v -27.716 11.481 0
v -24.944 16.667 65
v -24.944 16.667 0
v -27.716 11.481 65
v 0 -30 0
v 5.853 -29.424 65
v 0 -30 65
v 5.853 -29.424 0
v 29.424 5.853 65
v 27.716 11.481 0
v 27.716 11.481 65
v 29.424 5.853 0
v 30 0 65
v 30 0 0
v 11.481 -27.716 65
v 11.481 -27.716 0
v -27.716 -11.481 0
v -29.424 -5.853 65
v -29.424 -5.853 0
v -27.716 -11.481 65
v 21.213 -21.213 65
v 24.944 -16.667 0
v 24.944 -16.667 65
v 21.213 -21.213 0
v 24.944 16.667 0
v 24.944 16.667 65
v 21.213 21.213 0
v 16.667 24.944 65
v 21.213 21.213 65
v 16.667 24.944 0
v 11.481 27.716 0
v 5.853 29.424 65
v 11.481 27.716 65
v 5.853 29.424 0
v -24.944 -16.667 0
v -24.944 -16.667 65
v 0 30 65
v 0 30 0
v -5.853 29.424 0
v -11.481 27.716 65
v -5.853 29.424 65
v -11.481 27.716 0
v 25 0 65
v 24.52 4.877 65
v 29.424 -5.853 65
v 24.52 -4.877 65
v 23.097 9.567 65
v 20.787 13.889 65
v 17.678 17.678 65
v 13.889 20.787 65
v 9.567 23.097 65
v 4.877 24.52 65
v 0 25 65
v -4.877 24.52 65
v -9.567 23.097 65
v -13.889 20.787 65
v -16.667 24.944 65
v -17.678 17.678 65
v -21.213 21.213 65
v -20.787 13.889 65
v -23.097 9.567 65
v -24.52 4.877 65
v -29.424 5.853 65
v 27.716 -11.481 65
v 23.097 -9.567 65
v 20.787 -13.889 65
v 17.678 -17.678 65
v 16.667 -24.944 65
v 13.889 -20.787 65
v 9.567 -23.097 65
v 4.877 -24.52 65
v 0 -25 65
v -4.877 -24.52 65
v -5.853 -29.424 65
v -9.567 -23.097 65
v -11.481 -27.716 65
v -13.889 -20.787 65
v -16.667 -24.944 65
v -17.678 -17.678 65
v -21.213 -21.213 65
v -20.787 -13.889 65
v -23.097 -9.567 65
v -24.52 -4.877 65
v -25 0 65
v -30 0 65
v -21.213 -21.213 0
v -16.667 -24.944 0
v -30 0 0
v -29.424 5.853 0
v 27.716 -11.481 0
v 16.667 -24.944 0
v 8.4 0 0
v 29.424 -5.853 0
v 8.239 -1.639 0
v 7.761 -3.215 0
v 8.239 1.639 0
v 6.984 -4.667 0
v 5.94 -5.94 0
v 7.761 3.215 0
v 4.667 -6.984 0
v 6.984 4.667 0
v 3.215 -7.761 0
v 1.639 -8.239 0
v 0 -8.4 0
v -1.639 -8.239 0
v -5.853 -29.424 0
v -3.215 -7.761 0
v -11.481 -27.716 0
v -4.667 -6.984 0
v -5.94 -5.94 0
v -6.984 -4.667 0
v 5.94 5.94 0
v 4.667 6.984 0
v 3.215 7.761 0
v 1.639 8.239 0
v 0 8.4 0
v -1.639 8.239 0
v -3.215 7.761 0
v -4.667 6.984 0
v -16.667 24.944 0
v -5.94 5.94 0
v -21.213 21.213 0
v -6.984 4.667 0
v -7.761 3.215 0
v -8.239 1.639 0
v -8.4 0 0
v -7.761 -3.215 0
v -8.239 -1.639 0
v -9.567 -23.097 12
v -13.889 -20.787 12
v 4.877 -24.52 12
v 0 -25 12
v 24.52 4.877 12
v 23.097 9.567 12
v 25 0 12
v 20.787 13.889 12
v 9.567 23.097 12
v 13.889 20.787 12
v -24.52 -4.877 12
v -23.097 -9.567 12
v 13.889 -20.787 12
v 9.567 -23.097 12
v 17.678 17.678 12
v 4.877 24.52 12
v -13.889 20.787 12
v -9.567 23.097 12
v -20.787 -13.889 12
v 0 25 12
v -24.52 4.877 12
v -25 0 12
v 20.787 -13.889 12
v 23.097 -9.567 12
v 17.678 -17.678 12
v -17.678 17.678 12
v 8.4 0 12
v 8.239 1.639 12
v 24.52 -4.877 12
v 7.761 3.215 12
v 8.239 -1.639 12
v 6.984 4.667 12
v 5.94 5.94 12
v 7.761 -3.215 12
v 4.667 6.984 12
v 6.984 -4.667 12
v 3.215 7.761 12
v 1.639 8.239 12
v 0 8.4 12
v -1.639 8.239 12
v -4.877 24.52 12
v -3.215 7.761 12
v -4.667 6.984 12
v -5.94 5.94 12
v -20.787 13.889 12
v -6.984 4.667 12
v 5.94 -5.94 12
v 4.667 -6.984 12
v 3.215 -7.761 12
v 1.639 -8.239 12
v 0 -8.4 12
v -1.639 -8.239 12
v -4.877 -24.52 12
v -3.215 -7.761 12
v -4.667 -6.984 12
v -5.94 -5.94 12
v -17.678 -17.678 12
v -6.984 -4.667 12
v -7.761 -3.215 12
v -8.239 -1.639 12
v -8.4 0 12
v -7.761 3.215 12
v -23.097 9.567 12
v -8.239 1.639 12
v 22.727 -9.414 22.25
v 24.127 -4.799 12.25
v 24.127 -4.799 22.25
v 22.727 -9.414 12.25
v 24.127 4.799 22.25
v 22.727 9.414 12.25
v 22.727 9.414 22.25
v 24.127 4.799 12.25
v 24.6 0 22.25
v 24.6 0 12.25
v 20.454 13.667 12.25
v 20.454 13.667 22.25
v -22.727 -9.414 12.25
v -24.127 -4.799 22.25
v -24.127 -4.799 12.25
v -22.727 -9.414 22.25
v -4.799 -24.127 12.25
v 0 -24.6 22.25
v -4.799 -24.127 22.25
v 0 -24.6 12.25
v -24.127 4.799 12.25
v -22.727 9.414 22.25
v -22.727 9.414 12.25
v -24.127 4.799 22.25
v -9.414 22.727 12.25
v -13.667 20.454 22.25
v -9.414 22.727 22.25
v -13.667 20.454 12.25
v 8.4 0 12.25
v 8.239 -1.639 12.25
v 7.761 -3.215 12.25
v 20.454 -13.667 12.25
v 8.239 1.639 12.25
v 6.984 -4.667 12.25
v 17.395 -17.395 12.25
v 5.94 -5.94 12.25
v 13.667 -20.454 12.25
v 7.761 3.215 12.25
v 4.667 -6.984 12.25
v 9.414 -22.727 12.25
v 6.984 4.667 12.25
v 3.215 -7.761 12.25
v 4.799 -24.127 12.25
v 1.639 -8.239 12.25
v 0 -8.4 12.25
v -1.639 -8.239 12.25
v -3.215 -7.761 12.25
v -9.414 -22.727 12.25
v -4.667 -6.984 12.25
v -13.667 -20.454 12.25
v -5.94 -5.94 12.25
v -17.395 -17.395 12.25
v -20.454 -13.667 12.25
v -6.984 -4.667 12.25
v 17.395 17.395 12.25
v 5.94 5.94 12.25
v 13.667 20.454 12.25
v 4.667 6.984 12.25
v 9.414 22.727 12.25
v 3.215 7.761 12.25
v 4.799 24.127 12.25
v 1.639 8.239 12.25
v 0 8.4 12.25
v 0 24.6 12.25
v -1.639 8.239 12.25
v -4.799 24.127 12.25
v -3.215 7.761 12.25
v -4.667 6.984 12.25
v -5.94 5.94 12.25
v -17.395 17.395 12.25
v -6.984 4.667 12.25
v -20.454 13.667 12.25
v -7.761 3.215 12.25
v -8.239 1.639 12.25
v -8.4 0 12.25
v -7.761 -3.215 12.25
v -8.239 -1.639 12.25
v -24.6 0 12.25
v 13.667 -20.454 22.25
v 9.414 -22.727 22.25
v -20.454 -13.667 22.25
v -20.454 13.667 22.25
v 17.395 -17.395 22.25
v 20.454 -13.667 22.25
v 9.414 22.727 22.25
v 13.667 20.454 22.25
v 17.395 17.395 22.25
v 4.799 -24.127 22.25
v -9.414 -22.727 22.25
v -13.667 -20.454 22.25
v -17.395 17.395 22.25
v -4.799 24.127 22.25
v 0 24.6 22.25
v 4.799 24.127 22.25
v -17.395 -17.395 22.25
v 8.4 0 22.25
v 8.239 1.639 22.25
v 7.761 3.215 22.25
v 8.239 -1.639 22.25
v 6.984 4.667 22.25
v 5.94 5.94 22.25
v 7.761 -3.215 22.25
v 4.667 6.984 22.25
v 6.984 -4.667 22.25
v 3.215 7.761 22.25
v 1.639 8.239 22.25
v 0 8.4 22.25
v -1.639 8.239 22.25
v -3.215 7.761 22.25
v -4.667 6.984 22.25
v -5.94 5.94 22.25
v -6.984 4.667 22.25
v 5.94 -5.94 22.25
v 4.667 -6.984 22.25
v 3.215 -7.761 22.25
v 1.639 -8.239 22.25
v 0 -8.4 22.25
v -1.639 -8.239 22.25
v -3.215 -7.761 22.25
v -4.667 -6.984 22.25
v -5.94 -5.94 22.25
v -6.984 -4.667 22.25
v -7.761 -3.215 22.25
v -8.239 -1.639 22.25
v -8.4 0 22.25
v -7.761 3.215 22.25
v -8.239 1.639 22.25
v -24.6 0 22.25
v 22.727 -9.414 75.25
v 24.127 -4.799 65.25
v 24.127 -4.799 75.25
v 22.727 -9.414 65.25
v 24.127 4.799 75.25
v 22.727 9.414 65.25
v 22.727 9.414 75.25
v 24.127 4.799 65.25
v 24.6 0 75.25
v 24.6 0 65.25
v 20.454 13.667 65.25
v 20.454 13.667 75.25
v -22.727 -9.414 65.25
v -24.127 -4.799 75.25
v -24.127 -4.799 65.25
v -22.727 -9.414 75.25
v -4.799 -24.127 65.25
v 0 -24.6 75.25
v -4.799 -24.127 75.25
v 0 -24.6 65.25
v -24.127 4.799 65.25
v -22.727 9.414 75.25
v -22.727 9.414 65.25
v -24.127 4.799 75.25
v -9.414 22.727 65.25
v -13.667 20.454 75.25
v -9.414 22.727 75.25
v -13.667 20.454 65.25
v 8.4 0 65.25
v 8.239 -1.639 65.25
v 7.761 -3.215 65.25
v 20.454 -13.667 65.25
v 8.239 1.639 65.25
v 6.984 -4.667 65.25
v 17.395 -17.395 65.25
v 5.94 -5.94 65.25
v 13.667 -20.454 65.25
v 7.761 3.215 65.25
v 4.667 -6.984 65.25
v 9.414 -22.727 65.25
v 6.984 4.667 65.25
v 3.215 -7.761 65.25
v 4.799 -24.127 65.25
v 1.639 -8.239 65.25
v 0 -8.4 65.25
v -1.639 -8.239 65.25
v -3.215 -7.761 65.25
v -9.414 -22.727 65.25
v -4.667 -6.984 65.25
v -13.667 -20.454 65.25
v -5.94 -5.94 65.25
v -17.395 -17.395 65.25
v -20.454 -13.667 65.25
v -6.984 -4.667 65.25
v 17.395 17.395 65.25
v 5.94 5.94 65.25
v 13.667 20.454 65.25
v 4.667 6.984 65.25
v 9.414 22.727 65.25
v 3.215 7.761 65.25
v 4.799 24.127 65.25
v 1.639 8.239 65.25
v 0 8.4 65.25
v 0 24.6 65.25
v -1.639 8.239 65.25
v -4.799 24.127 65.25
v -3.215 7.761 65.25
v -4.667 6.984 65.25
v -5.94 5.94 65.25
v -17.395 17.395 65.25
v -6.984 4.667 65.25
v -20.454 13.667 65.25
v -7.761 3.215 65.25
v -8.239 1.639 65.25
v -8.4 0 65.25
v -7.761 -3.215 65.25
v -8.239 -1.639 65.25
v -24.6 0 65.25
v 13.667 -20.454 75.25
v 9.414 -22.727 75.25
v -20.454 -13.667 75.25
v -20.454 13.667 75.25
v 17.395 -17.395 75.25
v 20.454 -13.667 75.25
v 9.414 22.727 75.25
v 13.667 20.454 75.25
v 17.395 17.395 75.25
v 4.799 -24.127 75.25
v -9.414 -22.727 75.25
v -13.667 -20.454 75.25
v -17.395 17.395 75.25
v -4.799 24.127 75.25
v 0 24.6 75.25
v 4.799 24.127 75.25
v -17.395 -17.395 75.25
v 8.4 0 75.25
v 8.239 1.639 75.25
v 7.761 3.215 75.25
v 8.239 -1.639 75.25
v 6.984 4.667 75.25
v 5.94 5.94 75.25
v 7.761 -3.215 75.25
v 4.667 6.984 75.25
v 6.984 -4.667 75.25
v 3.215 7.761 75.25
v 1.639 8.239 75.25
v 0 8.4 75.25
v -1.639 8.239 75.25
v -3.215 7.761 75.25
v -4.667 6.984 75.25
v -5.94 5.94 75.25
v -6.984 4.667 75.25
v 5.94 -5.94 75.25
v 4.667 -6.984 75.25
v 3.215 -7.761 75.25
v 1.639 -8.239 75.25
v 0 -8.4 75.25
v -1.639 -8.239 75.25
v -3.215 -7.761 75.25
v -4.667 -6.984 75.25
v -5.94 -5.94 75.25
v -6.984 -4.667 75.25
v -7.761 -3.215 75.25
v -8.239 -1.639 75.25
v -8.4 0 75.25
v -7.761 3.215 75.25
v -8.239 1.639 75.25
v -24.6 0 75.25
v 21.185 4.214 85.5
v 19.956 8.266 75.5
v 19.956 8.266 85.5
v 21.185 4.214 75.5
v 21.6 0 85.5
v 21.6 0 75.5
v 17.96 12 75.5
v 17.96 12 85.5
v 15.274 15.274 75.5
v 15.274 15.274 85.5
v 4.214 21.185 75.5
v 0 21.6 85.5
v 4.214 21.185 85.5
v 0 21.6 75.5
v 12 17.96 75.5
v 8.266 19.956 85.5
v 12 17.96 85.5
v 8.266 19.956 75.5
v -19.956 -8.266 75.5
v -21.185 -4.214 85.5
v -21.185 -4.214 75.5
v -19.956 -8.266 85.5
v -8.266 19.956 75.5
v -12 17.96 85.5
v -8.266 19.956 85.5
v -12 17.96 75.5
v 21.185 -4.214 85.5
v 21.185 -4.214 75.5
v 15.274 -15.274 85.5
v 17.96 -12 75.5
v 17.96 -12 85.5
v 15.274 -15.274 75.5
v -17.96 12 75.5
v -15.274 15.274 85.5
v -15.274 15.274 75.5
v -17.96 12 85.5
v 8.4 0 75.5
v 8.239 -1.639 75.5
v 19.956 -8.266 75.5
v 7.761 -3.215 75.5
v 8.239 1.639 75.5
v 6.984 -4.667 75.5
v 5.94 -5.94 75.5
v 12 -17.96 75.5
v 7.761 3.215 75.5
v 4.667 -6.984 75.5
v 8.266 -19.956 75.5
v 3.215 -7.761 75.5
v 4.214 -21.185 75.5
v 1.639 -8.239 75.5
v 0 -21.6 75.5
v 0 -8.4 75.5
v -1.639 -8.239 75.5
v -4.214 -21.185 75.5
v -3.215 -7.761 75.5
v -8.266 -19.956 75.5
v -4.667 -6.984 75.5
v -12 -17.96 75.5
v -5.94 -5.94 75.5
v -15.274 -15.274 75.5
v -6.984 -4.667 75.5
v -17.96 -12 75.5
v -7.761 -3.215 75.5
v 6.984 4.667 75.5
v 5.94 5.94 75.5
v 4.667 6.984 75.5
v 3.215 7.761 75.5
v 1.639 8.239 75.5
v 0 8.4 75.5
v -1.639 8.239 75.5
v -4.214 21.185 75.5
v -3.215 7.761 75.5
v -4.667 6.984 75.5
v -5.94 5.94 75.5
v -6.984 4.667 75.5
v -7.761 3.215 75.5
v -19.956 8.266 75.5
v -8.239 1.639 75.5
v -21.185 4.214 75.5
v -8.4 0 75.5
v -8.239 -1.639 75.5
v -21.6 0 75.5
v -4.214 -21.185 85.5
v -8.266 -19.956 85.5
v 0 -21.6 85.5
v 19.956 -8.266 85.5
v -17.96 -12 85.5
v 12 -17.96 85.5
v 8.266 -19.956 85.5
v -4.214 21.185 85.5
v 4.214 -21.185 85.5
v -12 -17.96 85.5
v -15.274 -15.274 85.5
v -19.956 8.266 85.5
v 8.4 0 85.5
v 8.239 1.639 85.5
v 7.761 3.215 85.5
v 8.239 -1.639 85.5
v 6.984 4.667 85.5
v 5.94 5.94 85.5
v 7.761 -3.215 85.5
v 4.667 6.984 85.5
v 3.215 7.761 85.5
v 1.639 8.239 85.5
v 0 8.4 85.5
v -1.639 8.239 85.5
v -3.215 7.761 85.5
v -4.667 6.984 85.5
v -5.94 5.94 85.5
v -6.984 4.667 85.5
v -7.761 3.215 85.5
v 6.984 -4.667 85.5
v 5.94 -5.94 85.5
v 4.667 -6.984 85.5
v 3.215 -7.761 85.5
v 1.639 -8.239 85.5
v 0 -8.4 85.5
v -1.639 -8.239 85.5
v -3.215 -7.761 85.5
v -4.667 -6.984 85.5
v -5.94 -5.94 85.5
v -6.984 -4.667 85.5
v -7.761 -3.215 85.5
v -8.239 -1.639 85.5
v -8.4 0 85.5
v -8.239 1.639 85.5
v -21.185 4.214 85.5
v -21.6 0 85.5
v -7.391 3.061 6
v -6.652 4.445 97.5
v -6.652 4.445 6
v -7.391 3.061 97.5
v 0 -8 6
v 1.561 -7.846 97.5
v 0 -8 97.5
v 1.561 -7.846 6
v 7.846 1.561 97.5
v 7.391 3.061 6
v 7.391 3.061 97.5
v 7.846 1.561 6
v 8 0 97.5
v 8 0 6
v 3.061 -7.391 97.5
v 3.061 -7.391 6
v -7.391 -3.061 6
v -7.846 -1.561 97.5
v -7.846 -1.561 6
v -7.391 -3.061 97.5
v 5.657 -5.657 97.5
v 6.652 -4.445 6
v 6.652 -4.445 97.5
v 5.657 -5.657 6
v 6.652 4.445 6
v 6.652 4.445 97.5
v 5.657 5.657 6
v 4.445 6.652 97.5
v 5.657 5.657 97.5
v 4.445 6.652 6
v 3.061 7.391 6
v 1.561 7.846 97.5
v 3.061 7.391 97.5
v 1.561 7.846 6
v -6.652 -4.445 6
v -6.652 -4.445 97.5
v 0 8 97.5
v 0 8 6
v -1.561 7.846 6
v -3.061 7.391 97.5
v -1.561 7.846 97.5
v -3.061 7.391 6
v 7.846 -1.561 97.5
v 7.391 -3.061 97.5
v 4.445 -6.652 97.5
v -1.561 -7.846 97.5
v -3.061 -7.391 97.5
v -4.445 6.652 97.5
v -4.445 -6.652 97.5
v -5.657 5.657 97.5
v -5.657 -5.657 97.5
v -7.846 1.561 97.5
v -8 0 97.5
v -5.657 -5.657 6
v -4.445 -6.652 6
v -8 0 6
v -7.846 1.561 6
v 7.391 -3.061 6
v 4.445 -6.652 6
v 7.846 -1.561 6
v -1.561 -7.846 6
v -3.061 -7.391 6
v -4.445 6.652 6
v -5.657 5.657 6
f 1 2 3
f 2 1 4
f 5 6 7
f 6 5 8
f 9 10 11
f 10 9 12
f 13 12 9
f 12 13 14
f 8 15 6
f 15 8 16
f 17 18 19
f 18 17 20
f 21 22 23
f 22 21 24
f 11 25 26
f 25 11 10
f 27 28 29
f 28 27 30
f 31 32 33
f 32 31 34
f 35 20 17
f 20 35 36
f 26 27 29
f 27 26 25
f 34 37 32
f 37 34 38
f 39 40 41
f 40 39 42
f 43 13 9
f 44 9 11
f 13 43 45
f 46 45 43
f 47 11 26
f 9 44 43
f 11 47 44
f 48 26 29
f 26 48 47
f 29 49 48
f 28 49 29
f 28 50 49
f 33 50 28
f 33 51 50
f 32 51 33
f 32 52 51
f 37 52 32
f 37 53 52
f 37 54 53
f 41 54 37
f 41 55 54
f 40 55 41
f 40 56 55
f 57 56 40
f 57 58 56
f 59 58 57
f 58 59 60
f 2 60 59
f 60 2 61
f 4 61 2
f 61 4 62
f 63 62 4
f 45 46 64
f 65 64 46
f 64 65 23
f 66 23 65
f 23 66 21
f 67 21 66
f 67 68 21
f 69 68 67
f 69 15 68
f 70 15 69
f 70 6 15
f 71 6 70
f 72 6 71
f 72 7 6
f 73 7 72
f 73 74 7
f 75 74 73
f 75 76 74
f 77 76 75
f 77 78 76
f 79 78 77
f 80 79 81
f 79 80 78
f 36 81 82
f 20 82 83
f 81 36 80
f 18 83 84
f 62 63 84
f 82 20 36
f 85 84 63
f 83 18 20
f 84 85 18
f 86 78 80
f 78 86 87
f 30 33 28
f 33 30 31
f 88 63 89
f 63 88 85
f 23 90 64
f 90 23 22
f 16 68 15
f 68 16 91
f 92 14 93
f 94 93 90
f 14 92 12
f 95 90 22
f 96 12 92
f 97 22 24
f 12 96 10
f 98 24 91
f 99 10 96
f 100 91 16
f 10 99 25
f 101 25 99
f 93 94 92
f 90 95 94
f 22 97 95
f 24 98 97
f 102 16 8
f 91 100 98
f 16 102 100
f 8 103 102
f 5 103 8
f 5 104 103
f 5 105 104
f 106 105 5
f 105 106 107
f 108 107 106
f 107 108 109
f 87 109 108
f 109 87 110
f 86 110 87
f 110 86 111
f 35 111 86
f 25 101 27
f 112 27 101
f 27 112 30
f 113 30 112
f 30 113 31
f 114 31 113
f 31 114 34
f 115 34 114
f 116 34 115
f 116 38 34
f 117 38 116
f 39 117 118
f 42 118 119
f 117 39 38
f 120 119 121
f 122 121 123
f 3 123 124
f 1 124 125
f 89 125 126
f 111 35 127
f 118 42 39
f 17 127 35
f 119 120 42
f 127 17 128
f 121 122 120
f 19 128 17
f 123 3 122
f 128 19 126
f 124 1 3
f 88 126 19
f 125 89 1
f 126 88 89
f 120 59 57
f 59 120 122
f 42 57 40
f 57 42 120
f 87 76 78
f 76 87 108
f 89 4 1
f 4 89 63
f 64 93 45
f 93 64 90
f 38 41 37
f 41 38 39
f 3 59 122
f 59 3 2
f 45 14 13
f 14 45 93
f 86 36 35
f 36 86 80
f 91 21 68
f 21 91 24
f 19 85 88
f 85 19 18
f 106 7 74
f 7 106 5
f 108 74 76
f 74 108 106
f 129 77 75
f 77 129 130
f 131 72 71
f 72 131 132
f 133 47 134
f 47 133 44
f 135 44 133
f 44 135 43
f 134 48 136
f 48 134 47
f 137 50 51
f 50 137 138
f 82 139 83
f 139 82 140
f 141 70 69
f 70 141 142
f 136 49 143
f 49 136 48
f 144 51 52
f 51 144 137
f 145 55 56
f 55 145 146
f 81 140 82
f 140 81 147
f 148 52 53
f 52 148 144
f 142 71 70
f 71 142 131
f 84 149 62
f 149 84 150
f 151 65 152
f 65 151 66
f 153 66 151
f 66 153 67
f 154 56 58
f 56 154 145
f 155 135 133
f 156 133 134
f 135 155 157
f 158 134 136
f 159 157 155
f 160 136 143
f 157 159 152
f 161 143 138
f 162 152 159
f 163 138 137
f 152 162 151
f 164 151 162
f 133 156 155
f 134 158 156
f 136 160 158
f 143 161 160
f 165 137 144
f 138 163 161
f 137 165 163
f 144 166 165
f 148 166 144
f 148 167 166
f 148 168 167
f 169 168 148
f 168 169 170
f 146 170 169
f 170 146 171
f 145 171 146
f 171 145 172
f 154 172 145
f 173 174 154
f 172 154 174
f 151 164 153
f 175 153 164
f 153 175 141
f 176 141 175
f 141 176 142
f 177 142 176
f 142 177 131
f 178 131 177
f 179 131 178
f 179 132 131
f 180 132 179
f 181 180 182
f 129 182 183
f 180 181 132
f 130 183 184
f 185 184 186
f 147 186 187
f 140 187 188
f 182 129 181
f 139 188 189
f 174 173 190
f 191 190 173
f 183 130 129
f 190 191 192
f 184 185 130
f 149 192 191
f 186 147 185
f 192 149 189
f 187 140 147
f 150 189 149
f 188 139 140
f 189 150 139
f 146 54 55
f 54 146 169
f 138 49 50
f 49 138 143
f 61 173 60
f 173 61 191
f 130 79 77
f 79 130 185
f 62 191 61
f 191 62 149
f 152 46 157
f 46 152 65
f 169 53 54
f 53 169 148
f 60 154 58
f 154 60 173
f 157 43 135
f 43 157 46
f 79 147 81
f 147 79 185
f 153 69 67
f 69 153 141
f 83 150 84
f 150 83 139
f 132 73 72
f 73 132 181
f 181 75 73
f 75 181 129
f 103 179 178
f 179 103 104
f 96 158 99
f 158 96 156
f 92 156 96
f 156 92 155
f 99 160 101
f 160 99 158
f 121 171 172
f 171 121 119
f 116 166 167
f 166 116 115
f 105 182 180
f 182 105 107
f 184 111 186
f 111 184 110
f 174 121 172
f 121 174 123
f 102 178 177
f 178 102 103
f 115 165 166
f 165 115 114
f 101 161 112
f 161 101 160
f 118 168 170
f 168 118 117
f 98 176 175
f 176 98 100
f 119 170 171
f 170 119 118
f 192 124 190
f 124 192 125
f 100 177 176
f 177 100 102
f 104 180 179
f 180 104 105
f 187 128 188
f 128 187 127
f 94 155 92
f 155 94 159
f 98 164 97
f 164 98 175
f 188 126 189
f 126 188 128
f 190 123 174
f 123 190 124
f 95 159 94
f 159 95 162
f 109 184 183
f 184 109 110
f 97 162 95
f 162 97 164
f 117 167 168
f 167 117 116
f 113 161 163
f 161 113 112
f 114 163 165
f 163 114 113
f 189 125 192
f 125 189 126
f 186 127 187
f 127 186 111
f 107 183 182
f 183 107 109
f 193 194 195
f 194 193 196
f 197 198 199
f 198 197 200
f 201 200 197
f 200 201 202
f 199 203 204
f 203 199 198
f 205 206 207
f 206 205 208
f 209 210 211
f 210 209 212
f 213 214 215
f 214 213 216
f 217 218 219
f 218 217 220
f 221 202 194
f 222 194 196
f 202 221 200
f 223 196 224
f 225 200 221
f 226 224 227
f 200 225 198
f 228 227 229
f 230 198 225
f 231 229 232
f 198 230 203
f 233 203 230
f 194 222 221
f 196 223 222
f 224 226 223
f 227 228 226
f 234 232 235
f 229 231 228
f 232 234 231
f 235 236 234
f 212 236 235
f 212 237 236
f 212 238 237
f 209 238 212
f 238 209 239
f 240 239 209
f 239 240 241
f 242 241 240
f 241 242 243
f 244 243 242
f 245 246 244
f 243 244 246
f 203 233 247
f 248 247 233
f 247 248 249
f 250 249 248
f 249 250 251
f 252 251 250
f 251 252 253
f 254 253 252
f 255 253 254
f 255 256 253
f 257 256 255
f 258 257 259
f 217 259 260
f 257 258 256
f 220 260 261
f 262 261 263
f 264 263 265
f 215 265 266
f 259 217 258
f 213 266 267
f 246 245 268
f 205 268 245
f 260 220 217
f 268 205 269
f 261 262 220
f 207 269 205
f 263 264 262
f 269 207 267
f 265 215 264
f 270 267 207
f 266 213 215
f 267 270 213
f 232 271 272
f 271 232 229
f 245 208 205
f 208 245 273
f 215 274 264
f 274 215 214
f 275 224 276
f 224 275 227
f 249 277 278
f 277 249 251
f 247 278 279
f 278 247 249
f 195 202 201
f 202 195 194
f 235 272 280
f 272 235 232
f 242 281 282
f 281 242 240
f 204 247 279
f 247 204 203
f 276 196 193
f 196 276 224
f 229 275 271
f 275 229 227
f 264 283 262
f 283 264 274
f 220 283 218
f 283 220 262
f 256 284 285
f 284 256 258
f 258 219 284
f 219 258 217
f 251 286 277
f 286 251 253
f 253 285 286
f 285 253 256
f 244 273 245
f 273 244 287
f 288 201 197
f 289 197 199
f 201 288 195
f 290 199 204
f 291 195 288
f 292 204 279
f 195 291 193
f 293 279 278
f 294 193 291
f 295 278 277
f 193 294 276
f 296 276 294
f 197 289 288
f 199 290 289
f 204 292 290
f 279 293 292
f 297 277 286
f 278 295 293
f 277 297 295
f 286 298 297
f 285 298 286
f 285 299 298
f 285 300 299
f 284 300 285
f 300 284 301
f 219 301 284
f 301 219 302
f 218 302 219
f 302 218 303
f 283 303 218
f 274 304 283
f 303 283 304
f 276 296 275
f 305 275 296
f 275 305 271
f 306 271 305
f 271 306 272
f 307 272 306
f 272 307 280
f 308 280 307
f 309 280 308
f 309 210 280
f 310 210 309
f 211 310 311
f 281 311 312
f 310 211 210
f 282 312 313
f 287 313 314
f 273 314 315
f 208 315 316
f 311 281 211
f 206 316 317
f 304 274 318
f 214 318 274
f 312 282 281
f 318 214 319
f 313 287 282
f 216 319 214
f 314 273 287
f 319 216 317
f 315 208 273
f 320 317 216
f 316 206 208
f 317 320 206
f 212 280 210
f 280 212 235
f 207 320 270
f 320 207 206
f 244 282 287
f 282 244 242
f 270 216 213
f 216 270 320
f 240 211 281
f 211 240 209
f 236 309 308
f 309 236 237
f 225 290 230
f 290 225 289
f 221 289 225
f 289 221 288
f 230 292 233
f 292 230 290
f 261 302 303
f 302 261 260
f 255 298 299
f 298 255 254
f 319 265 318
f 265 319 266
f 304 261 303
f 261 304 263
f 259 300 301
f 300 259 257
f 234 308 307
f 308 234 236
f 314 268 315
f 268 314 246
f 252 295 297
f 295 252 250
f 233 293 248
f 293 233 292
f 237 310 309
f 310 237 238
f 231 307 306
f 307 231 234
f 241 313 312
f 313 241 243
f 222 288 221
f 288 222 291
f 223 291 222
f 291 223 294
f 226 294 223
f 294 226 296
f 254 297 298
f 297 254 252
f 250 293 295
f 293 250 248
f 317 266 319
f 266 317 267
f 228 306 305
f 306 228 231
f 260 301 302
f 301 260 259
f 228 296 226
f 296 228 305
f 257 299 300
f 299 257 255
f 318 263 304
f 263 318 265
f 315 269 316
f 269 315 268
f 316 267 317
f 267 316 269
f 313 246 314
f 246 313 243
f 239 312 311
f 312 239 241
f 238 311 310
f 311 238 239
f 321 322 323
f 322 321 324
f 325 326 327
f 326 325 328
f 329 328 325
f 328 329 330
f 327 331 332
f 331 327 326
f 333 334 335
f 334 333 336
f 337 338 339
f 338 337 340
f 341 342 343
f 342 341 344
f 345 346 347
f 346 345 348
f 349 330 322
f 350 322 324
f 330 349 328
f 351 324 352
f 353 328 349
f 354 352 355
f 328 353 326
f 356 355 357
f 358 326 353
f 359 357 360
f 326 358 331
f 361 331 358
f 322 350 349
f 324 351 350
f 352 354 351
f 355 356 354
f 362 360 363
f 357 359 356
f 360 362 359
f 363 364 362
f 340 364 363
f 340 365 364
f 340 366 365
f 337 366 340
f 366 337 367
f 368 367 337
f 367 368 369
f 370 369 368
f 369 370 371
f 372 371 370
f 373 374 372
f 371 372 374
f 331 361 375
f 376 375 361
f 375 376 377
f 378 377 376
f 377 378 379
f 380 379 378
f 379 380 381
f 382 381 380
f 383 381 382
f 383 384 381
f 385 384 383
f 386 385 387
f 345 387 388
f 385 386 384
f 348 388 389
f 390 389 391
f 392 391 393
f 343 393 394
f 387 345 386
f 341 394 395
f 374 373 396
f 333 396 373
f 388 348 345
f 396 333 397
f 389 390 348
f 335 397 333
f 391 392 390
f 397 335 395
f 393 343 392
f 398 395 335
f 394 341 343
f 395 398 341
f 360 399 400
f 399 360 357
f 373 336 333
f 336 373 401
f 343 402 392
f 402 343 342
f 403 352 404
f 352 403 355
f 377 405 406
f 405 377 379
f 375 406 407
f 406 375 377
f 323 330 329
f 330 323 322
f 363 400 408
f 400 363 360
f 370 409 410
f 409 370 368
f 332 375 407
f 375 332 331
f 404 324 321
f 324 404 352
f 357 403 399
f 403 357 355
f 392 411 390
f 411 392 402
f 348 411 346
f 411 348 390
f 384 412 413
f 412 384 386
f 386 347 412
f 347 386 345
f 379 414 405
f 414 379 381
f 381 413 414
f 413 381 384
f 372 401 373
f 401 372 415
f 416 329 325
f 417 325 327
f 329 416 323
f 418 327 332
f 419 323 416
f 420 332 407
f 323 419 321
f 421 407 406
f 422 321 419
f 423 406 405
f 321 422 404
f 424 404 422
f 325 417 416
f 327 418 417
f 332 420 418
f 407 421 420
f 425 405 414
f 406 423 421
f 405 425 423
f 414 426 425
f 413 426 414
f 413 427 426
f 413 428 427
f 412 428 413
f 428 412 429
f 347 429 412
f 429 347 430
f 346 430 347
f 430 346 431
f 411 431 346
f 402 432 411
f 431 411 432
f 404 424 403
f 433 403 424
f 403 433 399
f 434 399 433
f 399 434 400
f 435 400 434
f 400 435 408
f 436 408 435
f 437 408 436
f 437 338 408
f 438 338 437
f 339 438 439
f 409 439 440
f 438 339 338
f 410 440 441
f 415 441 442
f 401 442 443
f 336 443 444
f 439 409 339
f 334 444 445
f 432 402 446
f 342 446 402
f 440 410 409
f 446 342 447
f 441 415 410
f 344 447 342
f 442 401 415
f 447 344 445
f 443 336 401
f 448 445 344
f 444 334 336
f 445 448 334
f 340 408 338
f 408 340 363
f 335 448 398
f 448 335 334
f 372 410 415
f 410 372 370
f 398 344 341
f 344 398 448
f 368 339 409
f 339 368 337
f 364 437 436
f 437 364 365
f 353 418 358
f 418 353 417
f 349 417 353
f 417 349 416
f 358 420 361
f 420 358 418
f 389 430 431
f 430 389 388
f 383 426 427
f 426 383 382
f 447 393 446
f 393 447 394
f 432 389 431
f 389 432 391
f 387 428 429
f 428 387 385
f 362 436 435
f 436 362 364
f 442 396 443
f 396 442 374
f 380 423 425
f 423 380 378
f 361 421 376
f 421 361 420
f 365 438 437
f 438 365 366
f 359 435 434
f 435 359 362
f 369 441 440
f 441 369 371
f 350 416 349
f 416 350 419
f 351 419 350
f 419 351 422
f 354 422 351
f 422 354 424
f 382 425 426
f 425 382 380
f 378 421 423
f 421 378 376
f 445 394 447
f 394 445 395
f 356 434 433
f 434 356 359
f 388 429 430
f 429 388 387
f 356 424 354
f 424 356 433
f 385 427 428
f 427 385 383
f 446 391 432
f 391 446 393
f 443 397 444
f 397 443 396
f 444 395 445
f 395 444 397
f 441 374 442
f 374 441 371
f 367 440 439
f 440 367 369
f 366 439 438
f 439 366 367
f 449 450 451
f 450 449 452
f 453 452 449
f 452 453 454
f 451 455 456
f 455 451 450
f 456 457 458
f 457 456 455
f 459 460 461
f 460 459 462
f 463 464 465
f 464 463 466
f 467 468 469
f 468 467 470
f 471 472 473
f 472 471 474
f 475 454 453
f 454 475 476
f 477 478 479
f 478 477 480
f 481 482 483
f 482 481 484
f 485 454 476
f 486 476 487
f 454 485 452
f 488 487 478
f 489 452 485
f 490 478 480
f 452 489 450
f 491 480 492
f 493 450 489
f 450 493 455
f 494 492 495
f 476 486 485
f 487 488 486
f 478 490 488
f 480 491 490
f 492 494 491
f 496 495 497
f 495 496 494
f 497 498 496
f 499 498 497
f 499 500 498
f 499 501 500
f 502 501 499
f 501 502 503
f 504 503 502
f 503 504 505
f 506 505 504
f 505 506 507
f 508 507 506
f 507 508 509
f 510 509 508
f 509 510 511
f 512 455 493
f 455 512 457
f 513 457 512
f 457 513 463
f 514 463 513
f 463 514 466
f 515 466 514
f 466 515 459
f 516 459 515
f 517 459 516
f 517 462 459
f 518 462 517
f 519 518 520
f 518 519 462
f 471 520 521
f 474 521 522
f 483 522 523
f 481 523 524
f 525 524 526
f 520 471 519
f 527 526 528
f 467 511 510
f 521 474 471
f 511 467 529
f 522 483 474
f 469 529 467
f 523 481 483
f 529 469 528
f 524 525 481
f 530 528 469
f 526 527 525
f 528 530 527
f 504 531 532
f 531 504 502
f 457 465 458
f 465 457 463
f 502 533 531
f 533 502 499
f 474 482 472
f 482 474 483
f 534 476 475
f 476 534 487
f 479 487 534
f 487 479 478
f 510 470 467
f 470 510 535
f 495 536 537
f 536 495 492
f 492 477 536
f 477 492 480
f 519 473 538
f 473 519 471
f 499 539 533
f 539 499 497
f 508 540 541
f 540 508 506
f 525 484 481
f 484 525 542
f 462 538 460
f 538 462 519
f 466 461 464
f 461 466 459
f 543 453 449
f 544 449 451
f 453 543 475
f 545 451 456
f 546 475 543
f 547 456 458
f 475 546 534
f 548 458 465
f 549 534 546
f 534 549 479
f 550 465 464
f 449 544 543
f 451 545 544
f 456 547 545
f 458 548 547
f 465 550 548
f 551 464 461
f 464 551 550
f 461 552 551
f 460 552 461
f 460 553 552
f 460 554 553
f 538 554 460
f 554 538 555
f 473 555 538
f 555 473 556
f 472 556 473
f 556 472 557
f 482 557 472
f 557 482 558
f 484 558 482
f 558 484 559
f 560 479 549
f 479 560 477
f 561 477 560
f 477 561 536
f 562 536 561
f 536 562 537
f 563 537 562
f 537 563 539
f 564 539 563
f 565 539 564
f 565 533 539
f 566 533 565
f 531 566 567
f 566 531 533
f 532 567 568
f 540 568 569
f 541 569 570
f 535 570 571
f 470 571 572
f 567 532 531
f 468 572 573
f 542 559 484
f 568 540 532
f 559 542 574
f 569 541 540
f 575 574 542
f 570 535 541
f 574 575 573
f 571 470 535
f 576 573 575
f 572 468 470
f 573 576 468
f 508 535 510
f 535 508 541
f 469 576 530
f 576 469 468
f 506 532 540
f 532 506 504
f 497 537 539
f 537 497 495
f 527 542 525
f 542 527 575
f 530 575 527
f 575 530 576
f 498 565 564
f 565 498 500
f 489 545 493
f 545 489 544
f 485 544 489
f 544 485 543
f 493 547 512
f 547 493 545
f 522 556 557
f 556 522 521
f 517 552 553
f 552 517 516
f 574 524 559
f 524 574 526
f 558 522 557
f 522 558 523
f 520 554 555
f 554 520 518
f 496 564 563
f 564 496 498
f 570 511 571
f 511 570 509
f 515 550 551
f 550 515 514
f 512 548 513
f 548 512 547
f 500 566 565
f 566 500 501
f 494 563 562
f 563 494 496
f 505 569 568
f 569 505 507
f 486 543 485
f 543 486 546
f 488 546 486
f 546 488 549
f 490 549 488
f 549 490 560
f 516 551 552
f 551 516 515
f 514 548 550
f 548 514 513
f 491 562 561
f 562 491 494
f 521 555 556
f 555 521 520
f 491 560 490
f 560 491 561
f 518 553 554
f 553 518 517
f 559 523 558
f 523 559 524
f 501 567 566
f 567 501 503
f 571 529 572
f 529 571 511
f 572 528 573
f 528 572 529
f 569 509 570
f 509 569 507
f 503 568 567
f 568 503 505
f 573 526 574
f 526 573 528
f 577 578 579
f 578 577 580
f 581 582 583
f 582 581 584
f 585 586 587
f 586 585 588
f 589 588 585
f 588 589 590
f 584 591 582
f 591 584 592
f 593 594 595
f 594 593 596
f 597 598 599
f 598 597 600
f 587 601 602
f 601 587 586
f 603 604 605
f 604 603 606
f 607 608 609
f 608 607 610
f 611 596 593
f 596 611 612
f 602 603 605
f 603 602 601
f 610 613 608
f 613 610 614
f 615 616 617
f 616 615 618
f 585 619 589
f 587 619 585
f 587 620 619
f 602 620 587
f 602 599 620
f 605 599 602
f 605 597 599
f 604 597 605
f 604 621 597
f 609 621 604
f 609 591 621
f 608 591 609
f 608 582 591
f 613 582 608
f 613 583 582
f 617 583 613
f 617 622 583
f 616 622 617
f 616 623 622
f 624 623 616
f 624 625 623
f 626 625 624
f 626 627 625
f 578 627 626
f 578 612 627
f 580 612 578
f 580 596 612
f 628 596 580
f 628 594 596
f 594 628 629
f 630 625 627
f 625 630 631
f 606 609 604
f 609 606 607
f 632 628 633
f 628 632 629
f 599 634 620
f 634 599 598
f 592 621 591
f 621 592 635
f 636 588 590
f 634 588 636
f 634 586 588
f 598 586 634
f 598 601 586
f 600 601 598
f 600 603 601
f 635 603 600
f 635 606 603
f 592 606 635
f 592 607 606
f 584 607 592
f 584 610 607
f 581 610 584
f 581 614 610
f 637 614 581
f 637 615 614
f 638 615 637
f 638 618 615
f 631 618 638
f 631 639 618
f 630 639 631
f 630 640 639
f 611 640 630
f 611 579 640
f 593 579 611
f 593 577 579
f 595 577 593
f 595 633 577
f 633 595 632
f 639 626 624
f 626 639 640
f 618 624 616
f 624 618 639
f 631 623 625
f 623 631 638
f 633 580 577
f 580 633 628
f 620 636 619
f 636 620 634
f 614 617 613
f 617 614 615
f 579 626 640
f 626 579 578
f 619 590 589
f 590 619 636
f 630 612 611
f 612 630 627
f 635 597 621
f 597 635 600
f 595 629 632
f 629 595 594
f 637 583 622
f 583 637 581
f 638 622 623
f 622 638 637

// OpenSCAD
$fn = 32;

// ------------------------------------------------------------------------
// Bearing housing: housing d60, two bearings and a shaft
// Every part is its own module, assembly() places them once.
// ------------------------------------------------------------------------

// --- part 1 ---
module housing() {
  difference() {
    cylinder(h = 65, d = 60);
    translate([0, 0, 12]) cylinder(h = 54, d = 50);
    translate([0, 0, -1]) cylinder(h = 14, d = 16.8);
  }
}

// --- part 2 ---
module bearing_lower() {
  difference() {
      translate([0, 0, 0]) cylinder(h = 10, d = 49.2);
      translate([0, 0, -1]) cylinder(h = 12, d = 16.8);
    }
}

// --- part 3 ---
module bearing_upper() {
  difference() {
      translate([0, 0, 0]) cylinder(h = 10, d = 49.2);
      translate([0, 0, -1]) cylinder(h = 12, d = 16.8);
    }
}

// --- part 4 ---
module spacer() {
  difference() {
      translate([0, 0, 0]) cylinder(h = 10, d = 43.2);
      translate([0, 0, -1]) cylinder(h = 12, d = 16.8);
    }
}

// --- part 5 ---
module shaft() {
  translate([0, 0, -45.75]) cylinder(h = 91.5, d = 16);
}

// --- assembly ---
module assembly() {
  translate([0, 0, 0]) rotate([0, 0, 0]) housing();
  translate([0, 0, 12.25]) rotate([0, 0, 0]) bearing_lower();
  translate([0, 0, 65.25]) rotate([0, 0, 0]) bearing_upper();
  translate([0, 0, 75.5]) rotate([0, 0, 0]) spacer();
  translate([0, 0, 51.75]) rotate([0, 0, 0]) shaft();
}

assembly();
